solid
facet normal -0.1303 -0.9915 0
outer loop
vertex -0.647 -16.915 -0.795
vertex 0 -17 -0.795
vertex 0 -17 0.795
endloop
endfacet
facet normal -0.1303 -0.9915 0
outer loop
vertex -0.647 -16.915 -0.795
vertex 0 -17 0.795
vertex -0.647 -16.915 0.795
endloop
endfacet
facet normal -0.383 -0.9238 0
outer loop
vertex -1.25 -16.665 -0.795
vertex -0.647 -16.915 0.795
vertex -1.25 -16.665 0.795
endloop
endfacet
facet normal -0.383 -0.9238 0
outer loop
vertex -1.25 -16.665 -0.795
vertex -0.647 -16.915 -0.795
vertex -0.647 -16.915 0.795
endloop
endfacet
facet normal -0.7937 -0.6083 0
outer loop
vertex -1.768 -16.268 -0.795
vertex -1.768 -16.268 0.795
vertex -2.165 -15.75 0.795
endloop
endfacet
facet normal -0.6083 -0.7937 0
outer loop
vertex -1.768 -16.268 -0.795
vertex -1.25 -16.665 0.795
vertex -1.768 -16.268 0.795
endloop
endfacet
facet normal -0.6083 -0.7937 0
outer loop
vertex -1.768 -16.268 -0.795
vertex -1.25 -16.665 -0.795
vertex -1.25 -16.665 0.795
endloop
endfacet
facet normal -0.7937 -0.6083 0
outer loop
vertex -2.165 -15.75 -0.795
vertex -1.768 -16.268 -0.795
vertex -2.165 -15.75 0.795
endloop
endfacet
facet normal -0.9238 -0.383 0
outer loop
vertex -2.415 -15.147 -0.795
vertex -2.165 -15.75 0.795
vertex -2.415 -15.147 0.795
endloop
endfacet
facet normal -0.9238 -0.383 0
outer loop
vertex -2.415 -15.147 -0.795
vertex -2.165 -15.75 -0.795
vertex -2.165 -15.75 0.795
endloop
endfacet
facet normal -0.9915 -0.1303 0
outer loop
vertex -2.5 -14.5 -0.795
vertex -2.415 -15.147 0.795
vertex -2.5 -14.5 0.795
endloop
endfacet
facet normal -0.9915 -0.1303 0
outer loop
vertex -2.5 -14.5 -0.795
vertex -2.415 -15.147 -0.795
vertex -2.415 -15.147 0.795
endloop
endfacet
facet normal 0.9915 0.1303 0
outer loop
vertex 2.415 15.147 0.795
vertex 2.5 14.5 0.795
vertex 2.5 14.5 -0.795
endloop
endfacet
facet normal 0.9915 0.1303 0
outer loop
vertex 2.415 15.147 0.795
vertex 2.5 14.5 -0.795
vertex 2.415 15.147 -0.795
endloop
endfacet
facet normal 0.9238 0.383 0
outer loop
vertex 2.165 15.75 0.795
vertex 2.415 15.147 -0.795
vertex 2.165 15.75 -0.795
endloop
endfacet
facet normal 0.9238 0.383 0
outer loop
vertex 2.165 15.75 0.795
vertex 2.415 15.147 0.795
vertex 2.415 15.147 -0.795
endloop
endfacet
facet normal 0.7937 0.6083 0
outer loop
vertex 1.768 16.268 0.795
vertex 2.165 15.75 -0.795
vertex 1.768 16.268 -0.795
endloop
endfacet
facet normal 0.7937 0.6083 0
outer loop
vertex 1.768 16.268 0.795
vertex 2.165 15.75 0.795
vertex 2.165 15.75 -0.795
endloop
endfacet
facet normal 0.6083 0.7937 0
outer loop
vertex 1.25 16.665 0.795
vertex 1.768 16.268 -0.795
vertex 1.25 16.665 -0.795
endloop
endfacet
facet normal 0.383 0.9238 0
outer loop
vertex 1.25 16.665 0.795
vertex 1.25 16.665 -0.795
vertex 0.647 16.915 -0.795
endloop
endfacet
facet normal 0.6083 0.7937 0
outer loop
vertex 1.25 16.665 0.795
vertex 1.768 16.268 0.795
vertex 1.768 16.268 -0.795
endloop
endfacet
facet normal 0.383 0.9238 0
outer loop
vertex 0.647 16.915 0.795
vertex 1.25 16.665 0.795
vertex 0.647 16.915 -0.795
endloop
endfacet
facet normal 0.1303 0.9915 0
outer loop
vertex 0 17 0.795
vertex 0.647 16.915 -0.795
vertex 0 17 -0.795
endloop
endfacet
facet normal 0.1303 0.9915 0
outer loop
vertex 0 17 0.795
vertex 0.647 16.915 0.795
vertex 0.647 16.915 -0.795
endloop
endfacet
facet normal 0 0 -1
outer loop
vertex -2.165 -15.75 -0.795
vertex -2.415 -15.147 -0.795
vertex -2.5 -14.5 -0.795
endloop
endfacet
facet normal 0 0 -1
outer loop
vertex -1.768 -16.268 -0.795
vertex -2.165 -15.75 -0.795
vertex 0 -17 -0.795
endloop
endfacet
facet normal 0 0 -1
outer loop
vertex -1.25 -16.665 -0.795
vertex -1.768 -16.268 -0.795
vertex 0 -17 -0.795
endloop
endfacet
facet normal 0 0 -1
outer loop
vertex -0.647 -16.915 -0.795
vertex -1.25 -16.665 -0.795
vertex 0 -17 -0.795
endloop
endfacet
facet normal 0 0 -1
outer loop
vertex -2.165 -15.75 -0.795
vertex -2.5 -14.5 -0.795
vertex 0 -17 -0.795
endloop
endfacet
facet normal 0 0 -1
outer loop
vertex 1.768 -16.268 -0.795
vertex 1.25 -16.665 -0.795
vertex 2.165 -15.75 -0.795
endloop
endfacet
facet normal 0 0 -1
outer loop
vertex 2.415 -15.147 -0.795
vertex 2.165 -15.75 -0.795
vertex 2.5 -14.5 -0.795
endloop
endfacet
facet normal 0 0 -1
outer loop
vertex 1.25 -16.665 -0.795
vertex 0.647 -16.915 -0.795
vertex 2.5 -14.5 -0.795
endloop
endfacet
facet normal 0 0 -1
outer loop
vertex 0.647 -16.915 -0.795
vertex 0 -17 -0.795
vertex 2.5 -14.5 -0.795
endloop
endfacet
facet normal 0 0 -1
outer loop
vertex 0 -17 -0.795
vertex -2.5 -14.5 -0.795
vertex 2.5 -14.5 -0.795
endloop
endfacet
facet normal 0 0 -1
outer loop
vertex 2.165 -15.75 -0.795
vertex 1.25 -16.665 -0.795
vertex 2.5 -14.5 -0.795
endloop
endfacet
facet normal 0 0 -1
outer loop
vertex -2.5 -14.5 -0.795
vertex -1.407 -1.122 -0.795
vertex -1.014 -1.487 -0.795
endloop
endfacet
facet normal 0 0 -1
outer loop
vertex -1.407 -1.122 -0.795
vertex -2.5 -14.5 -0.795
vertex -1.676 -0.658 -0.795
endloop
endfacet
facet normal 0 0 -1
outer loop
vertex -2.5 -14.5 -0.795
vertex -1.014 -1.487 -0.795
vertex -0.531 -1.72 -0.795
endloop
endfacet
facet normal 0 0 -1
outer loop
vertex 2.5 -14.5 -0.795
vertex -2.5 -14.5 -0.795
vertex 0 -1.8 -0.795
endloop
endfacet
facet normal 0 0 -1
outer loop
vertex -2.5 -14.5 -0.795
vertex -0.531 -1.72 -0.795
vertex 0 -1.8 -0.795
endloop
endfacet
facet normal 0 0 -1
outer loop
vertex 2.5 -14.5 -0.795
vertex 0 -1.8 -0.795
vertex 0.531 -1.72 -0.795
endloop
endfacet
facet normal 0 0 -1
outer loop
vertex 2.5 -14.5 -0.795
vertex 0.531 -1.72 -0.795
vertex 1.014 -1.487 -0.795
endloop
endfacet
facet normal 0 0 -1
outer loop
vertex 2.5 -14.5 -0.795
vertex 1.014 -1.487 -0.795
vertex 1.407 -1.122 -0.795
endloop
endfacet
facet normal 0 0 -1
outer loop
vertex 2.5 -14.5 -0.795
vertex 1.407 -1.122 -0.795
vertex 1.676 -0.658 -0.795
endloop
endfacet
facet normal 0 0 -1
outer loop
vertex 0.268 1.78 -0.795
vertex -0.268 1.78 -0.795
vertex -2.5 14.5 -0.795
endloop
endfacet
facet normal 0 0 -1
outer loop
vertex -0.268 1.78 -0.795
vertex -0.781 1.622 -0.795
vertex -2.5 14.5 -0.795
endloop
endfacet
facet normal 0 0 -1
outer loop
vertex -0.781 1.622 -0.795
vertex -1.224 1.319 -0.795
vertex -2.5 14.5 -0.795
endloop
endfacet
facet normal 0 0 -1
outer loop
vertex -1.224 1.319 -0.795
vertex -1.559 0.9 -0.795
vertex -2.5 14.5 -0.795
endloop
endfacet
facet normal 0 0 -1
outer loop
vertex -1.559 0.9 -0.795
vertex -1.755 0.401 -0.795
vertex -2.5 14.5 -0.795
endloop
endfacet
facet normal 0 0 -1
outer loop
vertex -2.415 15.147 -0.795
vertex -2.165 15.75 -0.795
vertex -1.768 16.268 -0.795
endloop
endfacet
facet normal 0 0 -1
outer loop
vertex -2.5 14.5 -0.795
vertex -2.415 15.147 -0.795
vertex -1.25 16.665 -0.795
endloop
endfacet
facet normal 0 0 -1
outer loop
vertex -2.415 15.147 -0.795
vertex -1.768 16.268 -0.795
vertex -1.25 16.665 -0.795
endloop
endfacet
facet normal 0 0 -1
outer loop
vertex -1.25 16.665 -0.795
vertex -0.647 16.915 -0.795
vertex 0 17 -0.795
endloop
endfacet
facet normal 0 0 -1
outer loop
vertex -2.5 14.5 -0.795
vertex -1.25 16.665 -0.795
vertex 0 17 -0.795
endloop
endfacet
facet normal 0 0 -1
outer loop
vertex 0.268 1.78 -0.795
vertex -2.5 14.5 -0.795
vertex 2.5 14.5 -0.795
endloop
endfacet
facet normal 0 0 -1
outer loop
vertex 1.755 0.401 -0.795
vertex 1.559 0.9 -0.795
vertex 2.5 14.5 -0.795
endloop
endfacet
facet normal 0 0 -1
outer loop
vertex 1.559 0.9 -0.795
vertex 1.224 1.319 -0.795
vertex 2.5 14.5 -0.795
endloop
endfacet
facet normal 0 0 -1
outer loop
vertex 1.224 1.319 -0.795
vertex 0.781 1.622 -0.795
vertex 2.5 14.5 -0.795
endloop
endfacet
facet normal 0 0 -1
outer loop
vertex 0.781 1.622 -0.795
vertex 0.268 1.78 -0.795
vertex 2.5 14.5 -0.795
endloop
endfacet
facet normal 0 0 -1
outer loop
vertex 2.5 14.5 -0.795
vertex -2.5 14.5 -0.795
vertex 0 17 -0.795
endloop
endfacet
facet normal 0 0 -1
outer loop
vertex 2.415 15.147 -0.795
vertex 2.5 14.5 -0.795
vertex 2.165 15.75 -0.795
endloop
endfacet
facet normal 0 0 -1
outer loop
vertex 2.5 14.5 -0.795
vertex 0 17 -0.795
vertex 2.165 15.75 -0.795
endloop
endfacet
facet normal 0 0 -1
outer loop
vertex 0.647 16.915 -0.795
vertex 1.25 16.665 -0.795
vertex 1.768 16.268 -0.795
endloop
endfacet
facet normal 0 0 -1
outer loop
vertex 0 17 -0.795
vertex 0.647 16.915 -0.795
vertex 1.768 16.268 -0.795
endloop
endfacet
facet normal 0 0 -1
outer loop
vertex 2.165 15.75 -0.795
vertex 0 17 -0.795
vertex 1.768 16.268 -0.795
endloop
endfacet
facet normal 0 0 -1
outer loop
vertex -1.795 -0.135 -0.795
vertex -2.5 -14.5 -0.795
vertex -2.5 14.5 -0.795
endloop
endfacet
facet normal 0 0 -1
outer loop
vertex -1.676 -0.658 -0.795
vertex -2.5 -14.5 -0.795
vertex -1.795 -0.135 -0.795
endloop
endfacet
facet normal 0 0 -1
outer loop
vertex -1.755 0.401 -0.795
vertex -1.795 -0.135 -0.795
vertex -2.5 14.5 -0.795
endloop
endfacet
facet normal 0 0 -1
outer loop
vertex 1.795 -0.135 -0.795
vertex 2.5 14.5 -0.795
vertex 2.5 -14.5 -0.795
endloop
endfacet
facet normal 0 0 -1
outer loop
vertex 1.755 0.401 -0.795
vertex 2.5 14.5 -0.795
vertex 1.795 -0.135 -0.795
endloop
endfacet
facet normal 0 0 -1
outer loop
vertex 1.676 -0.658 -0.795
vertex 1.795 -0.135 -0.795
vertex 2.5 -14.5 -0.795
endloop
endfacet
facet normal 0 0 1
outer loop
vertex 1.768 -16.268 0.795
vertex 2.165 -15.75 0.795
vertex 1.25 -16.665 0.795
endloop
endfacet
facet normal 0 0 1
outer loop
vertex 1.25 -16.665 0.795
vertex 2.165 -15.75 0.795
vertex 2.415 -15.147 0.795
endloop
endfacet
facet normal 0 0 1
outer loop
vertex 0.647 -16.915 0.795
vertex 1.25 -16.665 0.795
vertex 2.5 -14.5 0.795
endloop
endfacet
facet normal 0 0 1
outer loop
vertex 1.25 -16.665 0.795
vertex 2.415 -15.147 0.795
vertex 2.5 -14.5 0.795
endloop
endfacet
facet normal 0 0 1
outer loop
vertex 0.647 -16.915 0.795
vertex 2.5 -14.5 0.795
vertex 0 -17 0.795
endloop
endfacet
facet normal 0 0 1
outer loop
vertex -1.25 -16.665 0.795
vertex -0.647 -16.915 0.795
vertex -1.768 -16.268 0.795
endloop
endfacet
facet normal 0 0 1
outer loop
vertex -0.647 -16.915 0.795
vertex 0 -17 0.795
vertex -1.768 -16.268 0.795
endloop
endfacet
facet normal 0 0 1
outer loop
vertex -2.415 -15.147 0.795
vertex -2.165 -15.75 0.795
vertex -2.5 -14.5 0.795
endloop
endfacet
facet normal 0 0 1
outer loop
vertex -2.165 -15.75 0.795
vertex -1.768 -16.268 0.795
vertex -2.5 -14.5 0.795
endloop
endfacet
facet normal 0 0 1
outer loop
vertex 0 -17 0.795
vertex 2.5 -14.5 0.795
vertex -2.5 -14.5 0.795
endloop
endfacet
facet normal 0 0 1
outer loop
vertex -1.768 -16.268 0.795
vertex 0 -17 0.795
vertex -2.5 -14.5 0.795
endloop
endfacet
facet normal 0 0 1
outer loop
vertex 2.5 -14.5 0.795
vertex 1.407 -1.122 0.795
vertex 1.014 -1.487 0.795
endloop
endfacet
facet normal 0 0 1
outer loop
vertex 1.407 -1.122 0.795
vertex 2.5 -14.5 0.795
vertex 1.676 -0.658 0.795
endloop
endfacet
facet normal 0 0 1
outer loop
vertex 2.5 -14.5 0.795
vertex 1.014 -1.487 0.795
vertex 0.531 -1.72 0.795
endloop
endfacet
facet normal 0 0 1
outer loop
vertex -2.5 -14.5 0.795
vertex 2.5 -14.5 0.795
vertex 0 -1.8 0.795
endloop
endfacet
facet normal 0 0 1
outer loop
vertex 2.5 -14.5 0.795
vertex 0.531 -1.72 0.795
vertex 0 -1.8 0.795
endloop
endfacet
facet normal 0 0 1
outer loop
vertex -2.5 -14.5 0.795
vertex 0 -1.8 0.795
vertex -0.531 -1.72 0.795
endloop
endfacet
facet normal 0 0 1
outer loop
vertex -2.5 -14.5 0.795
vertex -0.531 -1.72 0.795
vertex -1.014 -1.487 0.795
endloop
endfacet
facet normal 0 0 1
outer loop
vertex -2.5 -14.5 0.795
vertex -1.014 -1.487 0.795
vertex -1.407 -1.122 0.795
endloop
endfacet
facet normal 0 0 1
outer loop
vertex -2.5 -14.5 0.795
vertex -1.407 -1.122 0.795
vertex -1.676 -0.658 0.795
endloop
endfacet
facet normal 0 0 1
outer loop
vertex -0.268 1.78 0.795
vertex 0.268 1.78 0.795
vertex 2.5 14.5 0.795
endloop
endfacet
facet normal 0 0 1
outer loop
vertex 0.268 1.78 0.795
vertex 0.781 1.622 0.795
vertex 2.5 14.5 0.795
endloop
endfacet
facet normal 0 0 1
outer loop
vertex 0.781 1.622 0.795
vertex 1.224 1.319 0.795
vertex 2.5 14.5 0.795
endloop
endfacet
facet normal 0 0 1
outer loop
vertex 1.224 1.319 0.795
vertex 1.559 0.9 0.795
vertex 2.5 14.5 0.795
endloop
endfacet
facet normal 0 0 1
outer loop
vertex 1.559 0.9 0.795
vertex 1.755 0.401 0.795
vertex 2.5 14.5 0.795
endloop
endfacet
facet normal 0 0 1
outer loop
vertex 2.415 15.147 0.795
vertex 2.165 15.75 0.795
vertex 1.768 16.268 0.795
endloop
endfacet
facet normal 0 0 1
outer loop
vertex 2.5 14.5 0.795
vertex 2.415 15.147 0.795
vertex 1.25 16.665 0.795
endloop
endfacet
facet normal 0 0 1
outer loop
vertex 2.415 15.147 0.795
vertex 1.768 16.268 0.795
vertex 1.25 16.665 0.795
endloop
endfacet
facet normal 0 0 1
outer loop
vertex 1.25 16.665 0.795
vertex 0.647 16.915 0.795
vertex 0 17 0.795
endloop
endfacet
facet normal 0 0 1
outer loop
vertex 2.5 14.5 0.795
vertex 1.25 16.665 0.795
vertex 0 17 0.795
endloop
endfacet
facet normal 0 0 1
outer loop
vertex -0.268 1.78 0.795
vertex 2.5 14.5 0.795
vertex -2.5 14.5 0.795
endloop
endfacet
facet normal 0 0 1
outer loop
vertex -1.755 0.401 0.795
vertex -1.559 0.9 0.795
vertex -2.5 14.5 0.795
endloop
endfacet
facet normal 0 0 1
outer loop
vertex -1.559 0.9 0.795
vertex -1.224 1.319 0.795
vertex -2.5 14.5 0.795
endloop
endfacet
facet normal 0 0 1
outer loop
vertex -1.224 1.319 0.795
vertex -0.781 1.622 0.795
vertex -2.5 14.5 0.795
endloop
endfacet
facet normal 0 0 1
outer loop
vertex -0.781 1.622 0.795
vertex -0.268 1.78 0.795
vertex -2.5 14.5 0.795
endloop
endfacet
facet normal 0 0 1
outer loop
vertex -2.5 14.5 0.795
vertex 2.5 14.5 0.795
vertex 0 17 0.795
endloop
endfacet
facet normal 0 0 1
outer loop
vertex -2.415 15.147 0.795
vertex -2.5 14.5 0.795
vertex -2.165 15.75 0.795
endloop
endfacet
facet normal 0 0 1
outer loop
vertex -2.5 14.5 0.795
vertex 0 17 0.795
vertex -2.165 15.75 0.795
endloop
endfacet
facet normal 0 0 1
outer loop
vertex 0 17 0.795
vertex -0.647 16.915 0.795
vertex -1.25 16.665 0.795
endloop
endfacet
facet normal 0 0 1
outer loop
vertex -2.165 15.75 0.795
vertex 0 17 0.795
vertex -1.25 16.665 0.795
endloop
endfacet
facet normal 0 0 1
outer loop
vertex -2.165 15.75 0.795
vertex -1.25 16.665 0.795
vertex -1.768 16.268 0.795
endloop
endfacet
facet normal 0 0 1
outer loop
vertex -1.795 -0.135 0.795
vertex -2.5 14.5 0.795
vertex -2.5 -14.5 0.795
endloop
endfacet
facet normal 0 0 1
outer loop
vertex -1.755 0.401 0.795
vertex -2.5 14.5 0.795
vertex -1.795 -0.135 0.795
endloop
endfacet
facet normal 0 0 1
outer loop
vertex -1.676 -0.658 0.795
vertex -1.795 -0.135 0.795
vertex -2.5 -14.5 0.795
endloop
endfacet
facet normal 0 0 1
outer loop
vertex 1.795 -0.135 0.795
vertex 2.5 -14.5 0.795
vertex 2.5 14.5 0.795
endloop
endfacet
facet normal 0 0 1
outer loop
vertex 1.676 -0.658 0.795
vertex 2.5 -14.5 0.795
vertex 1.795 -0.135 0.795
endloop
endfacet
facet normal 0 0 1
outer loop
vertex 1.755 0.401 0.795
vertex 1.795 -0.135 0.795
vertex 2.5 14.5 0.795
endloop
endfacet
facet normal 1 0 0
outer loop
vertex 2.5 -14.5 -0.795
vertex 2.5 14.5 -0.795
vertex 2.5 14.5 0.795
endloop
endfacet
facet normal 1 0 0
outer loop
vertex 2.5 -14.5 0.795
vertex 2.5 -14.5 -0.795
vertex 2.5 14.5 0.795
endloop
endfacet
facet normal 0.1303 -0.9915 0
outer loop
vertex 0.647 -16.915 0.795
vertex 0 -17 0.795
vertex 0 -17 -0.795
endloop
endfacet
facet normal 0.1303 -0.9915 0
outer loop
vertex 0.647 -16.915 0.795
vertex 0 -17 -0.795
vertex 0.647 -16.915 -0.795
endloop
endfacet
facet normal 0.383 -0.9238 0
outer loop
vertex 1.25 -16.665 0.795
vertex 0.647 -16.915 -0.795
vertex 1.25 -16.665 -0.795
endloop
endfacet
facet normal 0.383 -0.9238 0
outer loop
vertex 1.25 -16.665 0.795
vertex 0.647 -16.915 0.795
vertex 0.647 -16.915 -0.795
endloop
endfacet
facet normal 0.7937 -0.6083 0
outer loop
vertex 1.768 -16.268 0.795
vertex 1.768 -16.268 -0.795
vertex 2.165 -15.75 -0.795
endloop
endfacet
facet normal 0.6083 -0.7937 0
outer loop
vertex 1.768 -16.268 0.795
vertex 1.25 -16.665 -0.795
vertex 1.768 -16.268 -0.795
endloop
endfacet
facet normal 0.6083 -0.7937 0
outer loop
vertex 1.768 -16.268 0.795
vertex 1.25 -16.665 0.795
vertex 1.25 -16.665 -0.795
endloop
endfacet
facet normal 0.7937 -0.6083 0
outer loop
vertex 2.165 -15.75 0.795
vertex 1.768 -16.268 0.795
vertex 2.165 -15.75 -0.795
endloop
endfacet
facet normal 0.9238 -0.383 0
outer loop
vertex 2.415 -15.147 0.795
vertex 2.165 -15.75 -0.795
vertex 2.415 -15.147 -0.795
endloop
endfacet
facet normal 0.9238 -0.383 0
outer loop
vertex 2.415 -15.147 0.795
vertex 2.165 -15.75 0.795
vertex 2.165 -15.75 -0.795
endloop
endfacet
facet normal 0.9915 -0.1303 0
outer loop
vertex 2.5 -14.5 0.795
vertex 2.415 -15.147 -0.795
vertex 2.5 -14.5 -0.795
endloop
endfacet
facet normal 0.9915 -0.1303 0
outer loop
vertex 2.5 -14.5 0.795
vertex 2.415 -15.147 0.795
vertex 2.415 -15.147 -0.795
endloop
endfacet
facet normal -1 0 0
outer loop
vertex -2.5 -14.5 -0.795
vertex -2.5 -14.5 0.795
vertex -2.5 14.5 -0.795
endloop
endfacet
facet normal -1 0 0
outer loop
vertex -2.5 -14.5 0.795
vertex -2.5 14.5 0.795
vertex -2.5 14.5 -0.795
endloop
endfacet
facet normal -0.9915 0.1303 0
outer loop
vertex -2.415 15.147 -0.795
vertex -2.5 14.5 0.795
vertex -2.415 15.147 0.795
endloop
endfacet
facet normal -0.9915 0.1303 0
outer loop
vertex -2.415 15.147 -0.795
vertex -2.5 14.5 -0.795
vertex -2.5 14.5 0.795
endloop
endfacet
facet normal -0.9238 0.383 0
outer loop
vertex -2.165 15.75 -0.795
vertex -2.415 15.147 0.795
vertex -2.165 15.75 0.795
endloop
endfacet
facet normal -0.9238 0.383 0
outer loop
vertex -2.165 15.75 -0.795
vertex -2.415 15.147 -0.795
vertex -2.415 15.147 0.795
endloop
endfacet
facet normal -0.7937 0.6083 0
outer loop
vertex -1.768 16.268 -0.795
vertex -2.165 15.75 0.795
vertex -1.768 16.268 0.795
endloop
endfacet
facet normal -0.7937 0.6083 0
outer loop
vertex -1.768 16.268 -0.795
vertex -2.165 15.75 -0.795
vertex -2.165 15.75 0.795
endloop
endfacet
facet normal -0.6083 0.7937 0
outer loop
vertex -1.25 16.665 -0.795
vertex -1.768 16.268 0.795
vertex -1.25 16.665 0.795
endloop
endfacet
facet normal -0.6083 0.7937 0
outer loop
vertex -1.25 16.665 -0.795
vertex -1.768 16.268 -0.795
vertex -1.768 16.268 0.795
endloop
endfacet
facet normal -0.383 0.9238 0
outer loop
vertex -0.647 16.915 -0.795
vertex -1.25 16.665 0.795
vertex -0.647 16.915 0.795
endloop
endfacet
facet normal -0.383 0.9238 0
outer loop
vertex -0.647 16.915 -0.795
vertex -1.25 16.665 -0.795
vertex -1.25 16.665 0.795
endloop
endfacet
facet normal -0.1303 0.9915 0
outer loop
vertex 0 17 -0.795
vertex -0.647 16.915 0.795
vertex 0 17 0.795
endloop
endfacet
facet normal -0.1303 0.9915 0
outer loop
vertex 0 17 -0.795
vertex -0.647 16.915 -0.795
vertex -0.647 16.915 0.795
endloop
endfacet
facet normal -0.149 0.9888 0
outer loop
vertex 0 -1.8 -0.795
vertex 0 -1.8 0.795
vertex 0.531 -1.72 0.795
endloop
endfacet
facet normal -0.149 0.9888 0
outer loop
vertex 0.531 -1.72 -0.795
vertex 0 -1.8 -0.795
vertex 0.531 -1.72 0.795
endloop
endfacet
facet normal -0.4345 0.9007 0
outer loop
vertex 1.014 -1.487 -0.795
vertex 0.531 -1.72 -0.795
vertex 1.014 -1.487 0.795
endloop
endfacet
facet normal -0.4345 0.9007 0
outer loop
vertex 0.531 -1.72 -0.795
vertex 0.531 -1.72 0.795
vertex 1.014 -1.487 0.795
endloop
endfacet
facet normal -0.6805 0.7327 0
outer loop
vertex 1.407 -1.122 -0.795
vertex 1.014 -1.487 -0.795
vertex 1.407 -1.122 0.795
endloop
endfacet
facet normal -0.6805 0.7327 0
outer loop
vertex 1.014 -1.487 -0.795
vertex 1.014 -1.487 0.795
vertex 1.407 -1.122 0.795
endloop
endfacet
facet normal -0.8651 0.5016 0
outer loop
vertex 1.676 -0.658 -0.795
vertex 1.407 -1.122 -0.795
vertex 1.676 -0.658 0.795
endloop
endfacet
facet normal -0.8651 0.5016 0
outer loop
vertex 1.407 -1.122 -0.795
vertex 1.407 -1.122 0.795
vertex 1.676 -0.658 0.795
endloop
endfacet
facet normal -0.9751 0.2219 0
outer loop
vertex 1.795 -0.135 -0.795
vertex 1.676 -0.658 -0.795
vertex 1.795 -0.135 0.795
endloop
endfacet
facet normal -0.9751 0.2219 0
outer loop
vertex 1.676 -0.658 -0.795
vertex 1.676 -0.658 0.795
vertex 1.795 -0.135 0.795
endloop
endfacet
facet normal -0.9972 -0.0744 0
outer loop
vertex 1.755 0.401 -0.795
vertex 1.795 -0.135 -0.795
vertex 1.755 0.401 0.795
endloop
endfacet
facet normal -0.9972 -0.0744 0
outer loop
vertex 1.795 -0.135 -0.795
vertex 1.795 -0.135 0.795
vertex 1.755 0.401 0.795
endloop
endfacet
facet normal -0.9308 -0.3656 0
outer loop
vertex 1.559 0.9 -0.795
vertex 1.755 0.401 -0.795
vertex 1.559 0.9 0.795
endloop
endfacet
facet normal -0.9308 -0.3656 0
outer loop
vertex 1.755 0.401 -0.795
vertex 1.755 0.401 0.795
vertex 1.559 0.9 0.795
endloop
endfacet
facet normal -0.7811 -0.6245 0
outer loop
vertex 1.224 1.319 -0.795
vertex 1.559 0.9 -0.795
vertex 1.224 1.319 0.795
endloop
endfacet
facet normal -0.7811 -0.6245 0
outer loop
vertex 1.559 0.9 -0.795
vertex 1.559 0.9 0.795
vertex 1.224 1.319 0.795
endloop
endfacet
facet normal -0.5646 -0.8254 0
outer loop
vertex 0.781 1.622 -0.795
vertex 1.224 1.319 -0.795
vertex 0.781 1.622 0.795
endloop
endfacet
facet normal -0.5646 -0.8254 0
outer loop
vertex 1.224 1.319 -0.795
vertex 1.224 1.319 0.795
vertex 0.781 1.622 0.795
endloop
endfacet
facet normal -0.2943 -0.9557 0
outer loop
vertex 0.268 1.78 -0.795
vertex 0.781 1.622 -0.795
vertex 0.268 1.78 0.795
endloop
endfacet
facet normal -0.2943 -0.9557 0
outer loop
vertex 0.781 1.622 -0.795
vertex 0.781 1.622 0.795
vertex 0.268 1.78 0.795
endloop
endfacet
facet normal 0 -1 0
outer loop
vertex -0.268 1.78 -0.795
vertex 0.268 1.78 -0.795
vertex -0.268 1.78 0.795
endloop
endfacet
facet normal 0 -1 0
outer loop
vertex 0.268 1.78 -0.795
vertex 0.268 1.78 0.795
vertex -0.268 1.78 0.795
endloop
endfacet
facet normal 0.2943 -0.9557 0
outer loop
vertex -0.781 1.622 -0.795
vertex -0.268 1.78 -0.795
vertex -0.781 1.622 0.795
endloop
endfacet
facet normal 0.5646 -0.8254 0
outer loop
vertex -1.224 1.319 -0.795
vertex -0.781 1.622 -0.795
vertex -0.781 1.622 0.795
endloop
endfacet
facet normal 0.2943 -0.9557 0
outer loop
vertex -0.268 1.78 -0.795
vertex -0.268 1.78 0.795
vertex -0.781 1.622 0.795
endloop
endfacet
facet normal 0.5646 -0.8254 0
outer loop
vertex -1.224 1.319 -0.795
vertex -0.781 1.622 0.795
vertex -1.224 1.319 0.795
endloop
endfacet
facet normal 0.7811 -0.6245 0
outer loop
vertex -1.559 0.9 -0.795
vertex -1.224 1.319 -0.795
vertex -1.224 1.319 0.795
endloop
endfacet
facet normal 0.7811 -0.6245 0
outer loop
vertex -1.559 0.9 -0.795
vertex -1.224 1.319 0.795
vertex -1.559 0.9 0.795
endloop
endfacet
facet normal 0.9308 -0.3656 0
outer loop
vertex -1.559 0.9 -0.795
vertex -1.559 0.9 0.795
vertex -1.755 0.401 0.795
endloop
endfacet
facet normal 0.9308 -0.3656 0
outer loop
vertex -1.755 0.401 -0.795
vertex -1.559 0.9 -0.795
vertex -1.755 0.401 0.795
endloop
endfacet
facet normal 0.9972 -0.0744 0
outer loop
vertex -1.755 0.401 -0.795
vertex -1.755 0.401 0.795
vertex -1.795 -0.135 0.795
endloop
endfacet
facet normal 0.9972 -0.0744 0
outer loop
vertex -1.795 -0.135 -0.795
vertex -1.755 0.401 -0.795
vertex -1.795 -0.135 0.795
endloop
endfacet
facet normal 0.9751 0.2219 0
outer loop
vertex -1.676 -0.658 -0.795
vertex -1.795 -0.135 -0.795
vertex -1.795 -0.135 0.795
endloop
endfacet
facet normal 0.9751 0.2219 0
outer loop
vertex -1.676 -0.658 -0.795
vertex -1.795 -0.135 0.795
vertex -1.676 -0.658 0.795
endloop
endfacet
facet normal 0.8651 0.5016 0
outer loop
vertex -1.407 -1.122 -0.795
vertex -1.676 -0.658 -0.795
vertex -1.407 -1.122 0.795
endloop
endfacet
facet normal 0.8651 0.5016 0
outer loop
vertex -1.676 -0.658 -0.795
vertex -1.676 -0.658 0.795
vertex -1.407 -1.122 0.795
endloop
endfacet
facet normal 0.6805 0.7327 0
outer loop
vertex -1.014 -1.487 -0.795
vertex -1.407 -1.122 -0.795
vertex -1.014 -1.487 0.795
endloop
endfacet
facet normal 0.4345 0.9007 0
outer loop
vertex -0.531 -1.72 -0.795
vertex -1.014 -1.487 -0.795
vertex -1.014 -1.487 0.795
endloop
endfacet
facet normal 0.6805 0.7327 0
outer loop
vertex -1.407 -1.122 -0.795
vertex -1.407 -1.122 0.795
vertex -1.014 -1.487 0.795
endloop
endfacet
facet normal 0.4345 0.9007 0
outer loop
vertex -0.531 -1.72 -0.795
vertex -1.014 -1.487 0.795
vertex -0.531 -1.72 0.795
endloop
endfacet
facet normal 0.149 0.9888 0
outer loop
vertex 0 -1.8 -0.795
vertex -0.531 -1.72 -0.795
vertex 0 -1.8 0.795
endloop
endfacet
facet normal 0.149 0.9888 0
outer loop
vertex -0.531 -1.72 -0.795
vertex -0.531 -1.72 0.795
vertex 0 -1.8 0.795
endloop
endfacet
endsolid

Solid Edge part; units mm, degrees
sketch "Sketch1" plane through (0, 0, 0) normal (0, -1, 0) x (1, 0, 0)
  line L0 (-2.5, -0.795) -> (2.5, -0.795)
  line L1 (2.5, -0.795) -> (2.5, 0.795)
  line L2 (2.5, 0.795) -> (-2.5, 0.795)
  line L3 (-2.5, 0.795) -> (-2.5, -0.795)
extrude "Protrusion1" add sketch "Sketch1" along normal mid plane 34
fillet "Round_2" radius 2.5 4 edges at (-2.5, -17, 0) (2.5, -17, 0) (2.5, 17, 0) (-2.5, 17, 0)
hole "Hole_1" at (0, 0, 0.795) direction (0, 0, -1) diameter 3.6 end through all
